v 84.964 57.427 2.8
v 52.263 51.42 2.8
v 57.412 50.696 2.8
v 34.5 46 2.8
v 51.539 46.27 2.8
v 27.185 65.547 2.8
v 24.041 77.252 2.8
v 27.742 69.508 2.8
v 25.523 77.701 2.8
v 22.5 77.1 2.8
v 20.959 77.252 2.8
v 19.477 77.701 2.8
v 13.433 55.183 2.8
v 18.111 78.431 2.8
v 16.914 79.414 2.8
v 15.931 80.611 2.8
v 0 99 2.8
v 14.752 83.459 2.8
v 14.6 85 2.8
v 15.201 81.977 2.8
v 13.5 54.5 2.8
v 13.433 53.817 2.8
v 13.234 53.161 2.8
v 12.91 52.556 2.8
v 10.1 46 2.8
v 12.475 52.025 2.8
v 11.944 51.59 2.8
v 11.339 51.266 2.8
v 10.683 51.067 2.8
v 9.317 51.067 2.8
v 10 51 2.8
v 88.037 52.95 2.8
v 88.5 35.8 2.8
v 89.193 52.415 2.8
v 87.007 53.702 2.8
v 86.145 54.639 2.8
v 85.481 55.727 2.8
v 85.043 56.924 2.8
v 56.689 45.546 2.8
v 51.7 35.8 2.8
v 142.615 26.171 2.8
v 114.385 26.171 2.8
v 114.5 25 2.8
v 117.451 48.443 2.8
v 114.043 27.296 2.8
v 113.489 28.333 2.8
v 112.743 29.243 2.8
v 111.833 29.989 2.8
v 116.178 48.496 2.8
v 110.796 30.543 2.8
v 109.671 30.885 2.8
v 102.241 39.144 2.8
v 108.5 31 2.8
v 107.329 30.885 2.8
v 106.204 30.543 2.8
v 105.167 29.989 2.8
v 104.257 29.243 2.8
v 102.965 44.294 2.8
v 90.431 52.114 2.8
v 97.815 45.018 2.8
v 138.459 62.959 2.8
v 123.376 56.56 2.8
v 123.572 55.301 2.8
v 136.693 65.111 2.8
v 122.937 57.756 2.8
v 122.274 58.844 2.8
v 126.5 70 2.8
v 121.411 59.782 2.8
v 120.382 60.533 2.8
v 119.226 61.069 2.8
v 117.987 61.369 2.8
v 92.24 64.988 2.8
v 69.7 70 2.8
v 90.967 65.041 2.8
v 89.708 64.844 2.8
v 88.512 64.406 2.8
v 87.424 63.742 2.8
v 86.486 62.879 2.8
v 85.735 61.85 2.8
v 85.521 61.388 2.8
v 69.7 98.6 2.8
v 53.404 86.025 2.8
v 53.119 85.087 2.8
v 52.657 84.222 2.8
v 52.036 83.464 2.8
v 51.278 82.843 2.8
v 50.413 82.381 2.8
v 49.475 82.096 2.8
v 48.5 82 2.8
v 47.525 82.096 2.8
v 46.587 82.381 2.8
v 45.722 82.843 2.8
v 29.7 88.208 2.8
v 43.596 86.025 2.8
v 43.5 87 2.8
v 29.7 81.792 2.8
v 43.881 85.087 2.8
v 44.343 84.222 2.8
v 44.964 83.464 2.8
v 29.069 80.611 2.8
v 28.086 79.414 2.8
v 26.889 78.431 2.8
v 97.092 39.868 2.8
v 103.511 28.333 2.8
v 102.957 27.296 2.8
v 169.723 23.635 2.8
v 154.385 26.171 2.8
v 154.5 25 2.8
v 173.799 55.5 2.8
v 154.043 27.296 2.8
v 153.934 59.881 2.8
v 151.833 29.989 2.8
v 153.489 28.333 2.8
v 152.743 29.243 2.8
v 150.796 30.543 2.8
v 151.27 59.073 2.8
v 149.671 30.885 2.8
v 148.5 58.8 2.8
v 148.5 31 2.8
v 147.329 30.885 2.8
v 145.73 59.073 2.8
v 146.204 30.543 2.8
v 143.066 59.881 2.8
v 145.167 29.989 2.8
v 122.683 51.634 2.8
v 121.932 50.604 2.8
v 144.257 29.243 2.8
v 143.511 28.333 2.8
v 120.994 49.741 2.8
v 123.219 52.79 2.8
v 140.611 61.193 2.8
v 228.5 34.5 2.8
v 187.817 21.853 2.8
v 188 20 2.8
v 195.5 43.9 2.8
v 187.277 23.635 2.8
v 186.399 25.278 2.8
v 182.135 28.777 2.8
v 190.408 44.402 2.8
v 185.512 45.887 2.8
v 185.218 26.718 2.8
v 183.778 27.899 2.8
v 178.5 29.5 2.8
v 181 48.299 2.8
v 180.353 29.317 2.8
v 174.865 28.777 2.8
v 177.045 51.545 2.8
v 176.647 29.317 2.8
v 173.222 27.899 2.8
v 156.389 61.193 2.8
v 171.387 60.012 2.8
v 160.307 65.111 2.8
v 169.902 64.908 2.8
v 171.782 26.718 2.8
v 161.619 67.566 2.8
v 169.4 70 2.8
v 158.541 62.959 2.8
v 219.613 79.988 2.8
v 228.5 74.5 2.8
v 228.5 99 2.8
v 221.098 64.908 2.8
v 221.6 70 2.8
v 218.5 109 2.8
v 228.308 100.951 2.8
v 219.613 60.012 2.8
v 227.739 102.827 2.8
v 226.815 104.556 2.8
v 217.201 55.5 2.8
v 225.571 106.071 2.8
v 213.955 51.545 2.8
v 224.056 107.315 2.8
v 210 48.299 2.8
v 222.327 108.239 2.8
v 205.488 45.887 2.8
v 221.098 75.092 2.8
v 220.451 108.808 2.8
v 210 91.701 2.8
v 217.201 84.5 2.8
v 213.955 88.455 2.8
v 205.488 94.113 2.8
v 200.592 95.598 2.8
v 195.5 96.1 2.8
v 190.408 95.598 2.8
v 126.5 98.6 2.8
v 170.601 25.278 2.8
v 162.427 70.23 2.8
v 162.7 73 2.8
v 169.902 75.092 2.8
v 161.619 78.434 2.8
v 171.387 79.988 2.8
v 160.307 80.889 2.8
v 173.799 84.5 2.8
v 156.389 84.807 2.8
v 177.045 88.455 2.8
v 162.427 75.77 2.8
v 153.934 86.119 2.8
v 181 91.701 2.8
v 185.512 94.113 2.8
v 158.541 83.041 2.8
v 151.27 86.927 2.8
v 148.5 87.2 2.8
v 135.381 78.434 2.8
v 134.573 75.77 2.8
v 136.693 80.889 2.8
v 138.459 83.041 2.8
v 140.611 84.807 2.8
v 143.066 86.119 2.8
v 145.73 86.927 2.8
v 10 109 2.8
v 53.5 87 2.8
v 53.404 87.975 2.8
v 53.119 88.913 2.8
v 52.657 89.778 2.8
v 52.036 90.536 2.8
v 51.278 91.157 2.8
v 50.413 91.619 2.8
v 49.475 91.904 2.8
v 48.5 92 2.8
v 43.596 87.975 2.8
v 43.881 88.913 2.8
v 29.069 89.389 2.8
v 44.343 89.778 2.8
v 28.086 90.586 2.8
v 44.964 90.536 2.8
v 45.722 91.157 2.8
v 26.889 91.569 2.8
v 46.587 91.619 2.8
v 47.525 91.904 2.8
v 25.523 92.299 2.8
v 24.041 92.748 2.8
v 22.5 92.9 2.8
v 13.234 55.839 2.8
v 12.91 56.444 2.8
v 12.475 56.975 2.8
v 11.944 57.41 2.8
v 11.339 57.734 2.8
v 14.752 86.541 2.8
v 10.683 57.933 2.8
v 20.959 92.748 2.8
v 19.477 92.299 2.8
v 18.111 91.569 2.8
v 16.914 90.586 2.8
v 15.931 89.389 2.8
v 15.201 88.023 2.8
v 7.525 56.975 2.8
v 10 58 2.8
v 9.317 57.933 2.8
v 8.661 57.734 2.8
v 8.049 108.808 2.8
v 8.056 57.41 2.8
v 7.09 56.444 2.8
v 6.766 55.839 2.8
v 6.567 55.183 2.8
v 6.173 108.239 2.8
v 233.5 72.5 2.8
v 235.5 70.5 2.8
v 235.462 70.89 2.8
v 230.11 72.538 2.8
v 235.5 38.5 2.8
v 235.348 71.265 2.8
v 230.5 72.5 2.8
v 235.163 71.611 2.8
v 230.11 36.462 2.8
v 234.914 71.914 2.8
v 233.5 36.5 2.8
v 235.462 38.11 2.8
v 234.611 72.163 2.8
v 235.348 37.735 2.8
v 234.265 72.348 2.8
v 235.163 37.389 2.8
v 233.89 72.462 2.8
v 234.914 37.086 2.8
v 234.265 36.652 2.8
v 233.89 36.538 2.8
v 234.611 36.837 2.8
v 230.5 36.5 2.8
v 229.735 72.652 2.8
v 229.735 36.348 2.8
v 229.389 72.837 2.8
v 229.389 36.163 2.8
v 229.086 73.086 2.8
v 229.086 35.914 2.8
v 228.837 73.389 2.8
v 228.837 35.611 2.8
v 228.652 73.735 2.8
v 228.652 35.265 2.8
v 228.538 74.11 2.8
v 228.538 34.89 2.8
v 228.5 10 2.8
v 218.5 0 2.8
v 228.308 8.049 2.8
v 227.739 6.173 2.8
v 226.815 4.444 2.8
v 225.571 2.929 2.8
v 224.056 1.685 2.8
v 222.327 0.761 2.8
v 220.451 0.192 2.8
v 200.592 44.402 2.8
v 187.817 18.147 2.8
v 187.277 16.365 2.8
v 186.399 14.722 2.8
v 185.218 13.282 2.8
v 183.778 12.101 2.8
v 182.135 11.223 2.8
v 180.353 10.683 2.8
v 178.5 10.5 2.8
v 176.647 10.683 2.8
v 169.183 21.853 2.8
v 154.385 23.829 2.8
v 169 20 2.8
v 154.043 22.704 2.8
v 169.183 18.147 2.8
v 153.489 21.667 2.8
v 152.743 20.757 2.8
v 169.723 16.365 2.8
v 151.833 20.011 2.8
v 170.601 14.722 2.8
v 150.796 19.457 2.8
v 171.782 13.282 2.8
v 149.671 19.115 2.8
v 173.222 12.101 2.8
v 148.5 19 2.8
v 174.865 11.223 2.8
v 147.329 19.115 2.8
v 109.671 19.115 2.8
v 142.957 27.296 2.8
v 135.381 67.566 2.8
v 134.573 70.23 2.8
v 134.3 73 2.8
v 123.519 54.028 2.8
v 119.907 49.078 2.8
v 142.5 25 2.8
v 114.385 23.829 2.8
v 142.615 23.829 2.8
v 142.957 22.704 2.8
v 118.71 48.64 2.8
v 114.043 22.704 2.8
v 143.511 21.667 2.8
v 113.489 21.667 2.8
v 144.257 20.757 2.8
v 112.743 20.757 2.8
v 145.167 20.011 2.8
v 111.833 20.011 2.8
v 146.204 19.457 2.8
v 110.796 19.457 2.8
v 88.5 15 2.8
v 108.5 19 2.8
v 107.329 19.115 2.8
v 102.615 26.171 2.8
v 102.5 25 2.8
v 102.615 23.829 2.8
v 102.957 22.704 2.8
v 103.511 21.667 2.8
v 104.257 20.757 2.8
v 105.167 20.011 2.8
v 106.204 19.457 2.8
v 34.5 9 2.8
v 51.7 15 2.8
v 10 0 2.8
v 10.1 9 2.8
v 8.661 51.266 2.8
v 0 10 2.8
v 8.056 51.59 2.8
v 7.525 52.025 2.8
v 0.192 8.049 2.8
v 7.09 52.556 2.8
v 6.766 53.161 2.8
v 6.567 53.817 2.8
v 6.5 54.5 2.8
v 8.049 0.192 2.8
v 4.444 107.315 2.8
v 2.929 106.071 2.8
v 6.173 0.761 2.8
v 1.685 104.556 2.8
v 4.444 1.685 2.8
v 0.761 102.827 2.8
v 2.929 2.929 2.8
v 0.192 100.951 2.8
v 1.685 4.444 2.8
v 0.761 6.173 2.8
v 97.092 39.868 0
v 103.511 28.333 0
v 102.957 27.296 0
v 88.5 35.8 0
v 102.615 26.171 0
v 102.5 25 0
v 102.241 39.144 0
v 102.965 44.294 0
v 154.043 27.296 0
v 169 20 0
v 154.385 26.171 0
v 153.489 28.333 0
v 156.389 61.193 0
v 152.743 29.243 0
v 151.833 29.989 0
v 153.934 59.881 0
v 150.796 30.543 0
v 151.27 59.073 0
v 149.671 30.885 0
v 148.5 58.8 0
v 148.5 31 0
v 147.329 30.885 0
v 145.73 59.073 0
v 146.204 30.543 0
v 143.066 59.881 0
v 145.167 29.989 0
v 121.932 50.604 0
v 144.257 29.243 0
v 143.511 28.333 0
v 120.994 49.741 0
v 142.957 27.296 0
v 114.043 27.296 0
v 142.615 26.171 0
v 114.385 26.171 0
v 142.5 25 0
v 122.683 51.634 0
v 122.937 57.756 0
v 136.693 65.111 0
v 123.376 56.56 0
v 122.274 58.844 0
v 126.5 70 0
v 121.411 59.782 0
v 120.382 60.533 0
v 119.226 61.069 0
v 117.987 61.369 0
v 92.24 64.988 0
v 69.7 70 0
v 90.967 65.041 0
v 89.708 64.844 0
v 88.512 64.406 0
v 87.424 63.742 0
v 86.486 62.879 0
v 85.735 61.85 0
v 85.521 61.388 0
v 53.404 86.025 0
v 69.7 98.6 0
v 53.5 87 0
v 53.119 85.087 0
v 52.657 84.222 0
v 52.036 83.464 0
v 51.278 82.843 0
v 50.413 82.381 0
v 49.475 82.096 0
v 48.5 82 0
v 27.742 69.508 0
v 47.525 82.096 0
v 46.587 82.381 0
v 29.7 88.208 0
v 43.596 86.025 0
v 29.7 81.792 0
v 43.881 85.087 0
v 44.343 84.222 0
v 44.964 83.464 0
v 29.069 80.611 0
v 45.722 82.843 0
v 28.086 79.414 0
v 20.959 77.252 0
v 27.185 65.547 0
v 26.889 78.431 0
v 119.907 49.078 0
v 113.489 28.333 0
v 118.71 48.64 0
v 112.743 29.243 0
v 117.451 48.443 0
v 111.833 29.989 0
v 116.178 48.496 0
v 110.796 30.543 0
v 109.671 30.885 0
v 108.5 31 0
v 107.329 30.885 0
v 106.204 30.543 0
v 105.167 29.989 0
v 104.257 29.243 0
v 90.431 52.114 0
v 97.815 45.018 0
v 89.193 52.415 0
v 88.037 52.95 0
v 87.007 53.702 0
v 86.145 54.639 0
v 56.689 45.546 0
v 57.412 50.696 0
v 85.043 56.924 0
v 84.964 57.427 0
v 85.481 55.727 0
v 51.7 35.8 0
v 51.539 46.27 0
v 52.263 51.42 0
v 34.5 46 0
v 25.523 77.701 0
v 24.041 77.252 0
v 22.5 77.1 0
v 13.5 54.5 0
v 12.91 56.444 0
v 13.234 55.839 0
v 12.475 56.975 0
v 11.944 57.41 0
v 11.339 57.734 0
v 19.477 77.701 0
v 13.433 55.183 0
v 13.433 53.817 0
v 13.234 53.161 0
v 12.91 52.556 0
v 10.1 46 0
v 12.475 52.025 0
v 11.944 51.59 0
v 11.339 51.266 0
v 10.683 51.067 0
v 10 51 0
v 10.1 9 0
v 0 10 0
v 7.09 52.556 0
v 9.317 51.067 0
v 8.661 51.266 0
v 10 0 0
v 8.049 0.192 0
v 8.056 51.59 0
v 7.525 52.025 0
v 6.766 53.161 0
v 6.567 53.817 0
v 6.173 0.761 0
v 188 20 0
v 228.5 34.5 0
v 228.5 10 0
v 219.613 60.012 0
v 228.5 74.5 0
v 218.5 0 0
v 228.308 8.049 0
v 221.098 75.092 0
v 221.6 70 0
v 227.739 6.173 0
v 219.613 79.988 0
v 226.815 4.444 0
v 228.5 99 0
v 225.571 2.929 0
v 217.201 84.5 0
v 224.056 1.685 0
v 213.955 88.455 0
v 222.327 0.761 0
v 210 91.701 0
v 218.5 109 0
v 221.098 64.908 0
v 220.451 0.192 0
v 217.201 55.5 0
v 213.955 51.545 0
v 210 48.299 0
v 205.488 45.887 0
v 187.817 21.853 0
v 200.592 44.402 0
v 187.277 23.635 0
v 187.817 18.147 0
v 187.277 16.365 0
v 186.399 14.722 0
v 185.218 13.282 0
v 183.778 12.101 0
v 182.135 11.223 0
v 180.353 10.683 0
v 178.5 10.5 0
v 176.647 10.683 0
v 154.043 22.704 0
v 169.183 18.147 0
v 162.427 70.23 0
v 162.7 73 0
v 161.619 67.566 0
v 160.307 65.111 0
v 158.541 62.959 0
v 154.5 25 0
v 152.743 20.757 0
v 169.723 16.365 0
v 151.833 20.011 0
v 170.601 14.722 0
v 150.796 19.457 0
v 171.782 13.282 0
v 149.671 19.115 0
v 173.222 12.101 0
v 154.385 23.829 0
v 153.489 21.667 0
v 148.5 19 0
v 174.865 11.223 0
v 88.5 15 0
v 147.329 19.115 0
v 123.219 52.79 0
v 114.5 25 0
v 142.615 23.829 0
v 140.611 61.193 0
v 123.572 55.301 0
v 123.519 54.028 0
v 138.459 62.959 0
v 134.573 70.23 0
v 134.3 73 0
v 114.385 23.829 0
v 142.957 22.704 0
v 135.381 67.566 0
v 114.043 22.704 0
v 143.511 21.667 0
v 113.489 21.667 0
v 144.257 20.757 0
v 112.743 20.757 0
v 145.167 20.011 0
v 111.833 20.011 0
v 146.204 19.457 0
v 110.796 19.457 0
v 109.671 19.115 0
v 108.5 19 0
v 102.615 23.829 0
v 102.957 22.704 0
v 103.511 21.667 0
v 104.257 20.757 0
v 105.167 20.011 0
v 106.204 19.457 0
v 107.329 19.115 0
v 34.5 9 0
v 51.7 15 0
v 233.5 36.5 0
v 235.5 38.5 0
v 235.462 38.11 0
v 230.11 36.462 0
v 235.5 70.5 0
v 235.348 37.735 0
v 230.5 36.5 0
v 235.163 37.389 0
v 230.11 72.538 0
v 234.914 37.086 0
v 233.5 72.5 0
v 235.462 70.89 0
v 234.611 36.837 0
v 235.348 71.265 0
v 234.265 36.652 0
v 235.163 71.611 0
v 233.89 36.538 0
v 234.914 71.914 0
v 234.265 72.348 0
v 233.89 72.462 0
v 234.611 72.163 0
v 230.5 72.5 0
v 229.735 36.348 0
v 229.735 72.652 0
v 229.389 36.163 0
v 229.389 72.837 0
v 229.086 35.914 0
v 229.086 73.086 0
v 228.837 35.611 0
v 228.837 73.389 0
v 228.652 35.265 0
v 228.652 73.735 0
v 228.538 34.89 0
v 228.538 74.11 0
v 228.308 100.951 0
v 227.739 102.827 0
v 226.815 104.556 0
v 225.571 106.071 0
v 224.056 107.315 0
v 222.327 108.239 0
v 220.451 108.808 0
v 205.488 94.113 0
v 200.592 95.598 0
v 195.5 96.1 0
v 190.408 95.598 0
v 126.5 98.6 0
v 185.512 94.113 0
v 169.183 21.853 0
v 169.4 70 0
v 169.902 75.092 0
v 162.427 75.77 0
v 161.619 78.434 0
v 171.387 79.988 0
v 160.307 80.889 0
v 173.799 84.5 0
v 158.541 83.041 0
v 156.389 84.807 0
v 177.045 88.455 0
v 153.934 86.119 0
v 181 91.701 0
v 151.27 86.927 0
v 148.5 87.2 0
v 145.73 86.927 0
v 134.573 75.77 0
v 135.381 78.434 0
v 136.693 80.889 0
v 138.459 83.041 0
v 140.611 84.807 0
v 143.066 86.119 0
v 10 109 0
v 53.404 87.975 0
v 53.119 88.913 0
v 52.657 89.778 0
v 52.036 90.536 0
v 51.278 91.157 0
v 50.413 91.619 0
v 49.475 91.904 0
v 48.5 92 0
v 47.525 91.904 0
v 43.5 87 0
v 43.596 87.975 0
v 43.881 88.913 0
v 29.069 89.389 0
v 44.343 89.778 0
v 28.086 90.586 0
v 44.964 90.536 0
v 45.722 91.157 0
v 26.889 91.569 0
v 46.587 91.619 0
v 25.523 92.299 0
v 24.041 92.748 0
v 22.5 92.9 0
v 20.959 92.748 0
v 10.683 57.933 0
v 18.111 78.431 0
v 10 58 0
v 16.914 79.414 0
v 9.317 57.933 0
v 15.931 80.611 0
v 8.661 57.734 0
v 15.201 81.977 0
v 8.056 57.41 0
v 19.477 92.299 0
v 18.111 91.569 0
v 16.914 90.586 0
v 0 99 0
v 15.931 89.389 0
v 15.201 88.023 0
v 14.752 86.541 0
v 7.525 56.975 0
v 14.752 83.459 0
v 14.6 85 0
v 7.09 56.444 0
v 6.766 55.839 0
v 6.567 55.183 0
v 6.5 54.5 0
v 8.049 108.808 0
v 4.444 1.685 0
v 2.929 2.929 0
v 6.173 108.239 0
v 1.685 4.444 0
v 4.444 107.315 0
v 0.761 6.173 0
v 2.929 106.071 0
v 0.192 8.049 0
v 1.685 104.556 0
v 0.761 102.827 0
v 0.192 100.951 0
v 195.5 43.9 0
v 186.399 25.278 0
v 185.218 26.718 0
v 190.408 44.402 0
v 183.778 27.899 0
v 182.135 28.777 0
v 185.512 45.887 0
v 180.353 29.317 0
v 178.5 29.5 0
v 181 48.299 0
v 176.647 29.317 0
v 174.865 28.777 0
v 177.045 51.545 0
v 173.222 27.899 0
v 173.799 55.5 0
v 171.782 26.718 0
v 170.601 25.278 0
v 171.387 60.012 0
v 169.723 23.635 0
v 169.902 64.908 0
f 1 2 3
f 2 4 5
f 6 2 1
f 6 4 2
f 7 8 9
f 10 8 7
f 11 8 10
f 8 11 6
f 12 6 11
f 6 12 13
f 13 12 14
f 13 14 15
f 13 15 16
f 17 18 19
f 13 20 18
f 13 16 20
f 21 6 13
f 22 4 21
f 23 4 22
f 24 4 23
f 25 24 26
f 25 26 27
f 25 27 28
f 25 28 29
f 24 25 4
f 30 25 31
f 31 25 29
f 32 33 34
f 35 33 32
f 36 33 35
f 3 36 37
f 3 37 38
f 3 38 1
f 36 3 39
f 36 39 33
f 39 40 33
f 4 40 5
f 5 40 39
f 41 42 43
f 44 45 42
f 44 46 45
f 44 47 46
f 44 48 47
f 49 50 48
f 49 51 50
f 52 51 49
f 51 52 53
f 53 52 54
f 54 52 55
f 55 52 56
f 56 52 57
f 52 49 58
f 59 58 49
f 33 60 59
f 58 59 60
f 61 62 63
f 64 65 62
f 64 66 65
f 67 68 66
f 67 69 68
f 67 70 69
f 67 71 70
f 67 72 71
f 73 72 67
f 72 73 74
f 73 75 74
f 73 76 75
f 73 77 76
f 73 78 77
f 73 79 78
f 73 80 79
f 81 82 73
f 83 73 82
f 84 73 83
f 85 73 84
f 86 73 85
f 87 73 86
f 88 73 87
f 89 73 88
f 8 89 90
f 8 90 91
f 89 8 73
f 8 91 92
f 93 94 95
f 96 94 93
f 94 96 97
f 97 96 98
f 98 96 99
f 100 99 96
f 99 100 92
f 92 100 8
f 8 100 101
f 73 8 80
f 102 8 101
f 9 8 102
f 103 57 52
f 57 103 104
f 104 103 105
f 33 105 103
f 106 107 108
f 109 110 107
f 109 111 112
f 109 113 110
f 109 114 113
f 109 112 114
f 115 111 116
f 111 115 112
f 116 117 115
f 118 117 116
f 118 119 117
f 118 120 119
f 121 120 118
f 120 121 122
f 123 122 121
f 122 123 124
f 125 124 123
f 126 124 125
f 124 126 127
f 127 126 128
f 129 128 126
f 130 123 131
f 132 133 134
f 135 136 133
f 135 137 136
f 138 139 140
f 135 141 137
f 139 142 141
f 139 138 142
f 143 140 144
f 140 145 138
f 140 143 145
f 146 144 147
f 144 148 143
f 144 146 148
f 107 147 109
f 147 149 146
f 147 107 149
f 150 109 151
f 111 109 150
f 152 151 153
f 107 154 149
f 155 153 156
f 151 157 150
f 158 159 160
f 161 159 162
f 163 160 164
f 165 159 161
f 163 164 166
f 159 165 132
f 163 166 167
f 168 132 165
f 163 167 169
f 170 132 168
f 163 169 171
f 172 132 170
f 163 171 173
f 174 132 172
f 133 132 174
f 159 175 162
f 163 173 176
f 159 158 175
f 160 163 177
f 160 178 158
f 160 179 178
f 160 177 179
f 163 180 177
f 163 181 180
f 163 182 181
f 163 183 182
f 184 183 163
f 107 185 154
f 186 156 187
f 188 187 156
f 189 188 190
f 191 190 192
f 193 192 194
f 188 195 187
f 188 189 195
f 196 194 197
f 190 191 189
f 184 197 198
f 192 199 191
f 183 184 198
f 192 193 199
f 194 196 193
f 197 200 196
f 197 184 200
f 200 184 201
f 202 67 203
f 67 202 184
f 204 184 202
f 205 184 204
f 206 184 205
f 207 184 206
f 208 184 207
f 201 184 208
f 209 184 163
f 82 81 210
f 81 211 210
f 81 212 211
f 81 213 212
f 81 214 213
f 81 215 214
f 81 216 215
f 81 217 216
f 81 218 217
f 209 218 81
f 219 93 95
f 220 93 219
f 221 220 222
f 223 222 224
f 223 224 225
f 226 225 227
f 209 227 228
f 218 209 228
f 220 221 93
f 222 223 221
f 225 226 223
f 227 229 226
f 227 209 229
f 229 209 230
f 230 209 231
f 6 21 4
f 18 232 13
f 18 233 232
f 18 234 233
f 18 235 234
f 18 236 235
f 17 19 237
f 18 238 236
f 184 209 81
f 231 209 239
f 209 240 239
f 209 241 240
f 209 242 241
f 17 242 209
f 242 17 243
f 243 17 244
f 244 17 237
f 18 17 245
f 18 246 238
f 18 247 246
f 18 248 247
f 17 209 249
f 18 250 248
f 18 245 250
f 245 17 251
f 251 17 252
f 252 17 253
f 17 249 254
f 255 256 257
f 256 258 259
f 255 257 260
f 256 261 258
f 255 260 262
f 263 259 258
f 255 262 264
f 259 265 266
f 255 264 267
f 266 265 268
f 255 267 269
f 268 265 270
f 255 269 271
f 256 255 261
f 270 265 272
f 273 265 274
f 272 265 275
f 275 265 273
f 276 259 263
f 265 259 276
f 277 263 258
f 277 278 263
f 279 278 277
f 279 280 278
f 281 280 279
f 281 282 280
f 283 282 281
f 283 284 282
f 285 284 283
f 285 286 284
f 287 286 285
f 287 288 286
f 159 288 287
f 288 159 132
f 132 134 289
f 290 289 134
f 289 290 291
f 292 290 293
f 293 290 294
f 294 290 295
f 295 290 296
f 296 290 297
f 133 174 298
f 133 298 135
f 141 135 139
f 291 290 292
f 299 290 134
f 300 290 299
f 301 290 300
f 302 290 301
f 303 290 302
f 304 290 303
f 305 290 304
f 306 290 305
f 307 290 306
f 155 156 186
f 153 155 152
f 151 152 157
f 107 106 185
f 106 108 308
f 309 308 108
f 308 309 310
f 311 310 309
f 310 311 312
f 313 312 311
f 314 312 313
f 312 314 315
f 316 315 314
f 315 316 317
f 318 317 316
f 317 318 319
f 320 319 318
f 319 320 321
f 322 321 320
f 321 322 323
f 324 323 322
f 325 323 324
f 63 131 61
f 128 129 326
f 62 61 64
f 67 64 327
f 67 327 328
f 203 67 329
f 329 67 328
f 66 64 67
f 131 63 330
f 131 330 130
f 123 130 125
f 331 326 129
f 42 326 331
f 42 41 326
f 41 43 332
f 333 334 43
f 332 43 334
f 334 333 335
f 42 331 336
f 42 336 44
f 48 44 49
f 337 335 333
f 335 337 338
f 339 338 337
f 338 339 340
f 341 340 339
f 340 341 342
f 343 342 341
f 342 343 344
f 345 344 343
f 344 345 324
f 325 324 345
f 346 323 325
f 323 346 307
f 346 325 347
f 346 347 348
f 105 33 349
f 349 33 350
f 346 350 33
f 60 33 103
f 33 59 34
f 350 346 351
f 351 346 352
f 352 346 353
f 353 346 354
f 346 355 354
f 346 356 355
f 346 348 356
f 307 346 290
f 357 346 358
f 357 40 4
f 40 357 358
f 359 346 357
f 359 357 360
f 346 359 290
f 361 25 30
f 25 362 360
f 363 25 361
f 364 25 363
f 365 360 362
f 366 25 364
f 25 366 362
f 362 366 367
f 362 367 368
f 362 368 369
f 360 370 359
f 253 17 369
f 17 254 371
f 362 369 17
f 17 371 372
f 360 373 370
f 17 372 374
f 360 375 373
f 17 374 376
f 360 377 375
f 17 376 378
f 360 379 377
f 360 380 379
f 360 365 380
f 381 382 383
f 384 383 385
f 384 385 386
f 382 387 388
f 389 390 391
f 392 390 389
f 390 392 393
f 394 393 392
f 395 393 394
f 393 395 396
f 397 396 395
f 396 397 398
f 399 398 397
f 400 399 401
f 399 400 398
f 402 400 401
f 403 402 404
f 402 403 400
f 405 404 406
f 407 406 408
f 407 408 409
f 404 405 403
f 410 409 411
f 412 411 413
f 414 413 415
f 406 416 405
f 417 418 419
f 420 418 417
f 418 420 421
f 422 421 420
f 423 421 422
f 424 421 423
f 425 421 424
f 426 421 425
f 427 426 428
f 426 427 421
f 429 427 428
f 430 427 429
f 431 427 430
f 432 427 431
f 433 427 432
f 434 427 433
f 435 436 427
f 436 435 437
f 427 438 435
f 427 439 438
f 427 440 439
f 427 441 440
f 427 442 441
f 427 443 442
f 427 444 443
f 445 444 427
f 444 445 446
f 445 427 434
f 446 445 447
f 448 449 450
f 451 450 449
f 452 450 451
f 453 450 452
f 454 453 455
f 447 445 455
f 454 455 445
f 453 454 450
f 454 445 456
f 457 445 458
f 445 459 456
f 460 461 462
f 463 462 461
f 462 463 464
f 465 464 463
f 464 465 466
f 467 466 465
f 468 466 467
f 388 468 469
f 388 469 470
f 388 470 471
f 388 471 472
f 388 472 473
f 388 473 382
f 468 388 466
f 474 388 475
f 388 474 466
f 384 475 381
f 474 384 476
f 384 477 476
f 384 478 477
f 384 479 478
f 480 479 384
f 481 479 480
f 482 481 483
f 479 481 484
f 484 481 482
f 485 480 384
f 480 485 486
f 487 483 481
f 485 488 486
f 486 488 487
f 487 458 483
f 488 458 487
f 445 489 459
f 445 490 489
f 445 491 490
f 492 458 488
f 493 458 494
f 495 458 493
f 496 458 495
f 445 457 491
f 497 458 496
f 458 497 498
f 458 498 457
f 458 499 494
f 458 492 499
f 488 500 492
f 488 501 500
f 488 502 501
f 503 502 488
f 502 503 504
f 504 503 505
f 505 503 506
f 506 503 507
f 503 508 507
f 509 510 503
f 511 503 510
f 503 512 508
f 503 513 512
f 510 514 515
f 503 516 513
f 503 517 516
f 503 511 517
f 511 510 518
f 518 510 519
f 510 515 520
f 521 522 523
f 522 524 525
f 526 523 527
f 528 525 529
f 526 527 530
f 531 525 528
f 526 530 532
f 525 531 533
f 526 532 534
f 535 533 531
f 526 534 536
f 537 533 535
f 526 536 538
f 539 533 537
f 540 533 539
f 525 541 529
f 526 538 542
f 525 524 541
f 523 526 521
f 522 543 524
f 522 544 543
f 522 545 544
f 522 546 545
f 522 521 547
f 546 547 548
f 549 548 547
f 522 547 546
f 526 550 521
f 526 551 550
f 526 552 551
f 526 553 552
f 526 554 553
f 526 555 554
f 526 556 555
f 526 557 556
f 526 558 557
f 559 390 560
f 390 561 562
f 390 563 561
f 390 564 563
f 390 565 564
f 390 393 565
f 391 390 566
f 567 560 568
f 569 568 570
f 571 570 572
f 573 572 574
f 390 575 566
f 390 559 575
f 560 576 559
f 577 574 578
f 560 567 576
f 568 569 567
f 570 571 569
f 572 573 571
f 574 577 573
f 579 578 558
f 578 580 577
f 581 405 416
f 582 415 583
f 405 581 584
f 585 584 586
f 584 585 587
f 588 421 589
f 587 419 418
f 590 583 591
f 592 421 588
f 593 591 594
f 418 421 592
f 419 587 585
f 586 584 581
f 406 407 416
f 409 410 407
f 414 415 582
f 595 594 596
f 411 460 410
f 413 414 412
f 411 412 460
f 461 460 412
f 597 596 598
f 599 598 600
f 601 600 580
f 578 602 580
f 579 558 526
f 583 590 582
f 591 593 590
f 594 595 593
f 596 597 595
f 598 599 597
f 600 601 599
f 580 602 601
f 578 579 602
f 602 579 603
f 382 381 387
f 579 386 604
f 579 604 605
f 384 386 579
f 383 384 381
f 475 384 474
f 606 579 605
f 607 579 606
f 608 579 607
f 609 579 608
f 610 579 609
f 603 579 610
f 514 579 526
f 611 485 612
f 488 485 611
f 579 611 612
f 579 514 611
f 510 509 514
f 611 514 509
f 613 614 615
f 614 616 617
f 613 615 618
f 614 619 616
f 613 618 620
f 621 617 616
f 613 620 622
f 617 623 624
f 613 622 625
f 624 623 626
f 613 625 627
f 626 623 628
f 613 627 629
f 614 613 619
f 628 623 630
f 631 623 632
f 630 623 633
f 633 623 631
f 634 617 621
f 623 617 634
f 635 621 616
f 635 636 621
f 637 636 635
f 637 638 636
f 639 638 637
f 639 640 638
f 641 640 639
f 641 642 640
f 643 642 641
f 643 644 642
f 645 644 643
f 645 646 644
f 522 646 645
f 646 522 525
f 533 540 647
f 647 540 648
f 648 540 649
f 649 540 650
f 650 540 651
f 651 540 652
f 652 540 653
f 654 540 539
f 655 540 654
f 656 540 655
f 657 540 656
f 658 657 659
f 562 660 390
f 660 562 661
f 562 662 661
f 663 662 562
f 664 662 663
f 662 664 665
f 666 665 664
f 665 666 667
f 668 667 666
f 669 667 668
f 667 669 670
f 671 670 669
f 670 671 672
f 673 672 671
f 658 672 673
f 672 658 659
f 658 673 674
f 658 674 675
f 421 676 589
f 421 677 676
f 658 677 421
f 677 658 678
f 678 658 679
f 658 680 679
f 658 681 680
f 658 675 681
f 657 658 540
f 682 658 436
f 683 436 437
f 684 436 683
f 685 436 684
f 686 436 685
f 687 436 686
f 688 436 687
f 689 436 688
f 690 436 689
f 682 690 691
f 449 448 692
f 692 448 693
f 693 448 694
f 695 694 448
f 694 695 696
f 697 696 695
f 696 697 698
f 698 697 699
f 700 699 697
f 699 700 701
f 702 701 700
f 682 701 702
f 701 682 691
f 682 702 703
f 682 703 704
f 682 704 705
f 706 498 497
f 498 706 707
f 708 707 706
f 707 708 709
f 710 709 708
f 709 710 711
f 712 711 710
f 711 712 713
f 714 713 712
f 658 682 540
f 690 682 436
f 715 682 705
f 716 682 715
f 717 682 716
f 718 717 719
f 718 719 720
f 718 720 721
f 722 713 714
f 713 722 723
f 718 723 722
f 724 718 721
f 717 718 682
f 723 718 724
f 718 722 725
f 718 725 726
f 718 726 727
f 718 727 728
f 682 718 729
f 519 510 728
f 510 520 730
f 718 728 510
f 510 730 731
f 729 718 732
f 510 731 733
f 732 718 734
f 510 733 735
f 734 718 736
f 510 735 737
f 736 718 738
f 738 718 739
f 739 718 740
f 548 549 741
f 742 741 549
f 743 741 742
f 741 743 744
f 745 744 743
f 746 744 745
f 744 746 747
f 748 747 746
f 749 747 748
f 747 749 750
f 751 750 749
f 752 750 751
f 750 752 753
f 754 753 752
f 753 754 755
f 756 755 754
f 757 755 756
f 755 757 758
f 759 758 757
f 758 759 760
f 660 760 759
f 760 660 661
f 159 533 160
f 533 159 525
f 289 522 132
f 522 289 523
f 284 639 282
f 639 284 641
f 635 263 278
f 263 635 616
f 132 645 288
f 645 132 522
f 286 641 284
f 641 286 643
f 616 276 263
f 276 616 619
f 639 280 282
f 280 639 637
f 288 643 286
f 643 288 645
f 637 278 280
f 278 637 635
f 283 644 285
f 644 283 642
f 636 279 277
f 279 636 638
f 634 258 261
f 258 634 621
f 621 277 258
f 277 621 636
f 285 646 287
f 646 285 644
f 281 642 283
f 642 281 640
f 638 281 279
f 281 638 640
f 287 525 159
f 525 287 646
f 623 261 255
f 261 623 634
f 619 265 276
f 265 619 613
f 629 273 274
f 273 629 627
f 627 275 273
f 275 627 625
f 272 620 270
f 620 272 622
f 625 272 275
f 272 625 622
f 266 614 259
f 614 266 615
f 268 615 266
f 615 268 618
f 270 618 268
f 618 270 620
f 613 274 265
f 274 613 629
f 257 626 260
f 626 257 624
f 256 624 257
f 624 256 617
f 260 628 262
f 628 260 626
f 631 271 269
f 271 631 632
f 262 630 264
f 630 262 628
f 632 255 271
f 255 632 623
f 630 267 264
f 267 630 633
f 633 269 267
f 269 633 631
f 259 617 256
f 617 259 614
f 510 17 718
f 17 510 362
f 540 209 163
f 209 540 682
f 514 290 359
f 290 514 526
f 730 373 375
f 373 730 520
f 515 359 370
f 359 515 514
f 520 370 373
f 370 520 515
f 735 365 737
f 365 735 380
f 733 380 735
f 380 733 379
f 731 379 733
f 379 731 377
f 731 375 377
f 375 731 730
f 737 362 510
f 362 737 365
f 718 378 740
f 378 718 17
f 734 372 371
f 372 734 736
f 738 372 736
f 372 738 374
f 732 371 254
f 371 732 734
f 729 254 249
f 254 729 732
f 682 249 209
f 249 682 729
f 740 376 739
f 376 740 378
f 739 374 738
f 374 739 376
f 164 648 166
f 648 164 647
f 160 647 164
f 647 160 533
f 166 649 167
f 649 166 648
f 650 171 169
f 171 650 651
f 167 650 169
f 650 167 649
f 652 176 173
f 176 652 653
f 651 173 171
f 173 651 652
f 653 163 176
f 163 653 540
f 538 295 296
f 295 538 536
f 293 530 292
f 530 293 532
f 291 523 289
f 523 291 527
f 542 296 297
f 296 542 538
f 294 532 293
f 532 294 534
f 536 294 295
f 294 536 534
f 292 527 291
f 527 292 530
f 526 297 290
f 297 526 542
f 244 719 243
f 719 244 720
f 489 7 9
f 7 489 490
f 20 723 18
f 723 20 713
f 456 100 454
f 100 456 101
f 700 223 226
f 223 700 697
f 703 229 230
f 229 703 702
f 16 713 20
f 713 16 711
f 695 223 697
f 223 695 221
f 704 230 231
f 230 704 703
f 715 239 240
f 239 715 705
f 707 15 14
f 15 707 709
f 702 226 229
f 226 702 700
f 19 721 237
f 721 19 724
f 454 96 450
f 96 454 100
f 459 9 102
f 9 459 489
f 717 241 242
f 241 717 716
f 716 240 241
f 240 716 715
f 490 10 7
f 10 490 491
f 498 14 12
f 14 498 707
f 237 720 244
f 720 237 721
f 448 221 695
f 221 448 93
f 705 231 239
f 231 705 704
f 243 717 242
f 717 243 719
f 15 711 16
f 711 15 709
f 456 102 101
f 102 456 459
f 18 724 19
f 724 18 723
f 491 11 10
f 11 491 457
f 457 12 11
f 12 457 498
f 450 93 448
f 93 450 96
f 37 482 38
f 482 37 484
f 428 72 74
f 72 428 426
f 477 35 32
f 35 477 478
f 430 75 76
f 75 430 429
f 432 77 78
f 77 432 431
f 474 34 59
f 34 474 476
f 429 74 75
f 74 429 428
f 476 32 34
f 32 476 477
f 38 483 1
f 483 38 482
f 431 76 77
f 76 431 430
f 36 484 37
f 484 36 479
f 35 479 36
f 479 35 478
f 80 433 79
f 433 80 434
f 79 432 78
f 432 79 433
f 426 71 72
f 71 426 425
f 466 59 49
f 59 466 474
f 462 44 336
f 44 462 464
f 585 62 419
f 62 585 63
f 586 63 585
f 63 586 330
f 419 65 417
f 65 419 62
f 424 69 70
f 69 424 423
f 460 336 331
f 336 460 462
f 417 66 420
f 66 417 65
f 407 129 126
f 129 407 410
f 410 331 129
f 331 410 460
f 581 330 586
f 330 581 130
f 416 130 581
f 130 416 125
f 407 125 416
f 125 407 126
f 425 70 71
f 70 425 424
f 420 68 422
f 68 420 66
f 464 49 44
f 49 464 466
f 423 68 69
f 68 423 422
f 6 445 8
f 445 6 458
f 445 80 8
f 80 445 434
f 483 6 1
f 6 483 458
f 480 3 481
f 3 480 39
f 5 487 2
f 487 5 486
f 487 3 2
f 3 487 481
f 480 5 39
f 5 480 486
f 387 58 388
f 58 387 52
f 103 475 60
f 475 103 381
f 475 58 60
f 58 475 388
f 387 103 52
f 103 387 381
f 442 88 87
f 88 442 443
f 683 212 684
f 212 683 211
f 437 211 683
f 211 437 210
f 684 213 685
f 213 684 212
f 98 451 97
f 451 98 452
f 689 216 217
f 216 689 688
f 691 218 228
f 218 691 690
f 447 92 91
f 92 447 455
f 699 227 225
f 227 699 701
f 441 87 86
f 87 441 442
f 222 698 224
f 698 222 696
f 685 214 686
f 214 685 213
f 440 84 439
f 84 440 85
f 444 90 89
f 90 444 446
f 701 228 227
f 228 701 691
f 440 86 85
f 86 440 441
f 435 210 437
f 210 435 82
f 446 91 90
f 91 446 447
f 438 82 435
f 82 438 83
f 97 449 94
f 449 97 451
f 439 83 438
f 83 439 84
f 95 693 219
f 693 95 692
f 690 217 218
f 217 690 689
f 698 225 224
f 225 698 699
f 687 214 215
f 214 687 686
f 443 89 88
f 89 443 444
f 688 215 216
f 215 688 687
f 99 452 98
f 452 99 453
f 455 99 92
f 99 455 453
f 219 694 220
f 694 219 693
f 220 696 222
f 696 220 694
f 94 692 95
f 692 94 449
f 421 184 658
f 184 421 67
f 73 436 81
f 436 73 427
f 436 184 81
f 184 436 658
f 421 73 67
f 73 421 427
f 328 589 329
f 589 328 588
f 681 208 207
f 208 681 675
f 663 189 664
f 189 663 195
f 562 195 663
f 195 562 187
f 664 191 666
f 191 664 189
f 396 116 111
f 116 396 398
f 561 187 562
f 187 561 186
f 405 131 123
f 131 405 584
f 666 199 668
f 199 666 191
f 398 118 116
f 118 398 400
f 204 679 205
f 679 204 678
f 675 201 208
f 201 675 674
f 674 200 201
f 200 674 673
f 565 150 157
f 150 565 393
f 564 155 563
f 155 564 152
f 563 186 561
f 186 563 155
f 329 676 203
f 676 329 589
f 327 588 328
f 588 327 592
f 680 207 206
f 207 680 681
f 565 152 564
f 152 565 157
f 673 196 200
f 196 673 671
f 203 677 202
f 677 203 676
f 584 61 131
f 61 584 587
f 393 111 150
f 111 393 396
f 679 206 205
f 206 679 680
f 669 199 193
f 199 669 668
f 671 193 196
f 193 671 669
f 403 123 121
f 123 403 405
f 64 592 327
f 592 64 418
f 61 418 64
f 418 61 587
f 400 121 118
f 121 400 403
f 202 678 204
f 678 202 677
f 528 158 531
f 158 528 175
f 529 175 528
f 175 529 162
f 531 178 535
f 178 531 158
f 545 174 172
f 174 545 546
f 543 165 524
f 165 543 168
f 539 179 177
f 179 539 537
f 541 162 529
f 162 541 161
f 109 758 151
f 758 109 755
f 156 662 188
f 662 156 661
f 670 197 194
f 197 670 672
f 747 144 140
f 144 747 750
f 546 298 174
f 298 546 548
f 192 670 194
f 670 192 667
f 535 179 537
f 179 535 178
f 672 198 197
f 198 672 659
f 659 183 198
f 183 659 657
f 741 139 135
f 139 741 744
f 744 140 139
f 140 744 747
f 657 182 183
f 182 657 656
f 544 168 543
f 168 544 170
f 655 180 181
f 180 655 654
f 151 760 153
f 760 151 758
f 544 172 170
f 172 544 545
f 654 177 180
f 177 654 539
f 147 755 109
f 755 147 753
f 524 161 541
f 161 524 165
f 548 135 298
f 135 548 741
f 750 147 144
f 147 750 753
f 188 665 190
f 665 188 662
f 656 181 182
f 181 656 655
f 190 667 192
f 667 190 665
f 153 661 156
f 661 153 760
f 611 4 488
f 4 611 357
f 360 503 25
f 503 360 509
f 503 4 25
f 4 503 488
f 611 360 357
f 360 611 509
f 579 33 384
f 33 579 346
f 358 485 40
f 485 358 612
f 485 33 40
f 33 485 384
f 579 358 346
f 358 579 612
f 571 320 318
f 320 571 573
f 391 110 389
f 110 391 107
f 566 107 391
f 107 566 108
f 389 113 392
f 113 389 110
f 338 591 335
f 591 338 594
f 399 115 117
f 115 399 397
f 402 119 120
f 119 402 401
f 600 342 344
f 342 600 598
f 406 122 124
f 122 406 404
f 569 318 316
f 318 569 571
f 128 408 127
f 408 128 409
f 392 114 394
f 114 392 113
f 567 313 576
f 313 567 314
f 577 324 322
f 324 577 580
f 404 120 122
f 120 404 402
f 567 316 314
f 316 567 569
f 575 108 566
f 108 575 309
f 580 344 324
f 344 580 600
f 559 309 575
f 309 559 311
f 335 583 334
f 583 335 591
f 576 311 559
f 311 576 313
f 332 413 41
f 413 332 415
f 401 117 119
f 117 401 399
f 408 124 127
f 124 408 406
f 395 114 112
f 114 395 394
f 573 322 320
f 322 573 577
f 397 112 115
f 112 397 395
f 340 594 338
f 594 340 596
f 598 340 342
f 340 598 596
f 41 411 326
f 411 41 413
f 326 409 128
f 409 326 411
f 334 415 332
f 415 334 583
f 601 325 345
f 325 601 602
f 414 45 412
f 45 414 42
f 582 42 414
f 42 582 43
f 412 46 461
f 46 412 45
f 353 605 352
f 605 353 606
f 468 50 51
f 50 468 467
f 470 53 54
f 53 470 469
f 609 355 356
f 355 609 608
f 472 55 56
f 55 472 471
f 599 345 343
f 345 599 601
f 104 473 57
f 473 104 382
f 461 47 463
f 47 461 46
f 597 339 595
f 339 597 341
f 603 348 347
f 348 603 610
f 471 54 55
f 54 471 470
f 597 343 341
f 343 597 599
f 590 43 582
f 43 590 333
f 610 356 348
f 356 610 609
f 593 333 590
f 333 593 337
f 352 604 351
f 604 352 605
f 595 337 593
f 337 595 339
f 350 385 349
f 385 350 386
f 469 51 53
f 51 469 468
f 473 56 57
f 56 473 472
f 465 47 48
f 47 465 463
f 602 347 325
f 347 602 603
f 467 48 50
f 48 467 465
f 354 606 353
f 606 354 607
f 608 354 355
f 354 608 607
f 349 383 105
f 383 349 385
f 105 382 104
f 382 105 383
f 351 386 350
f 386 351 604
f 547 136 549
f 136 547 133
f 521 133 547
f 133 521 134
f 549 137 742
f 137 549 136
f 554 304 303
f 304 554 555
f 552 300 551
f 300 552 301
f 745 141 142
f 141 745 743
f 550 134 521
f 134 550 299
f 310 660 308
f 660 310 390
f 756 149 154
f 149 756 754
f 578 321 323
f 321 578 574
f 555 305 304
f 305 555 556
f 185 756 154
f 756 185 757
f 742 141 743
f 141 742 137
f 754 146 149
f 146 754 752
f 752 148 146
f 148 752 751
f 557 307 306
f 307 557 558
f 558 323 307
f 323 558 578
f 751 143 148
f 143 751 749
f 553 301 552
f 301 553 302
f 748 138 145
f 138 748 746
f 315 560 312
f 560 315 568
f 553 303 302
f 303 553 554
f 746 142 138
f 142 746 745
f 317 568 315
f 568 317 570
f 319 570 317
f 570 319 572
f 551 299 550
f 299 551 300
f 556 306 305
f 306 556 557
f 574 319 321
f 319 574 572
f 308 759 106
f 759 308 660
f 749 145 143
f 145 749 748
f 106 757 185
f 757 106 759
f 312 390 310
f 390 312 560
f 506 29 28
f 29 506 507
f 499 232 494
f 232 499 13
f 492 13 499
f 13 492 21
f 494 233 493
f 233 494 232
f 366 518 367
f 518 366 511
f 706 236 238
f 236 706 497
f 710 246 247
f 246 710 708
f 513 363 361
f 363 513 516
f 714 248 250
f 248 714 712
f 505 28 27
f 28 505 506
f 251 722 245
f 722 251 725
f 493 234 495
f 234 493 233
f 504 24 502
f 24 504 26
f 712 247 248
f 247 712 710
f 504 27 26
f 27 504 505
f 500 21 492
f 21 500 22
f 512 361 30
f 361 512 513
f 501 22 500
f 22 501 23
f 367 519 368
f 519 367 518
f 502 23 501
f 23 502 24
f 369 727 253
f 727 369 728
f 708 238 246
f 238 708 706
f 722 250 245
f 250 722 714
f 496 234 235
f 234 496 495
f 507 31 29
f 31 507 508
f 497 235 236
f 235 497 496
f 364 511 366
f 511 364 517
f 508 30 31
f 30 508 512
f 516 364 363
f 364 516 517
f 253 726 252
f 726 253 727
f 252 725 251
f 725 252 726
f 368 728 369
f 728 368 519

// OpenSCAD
$fn=32;

// projection(cut = true) 
mowerPlate();

module mowerPlate() {
  difference() {
    plateLength = 228.5; 
    plateWidth = 109; 
    plateThickness = 2.8;
  
    plate(l=plateLength,w=plateWidth,t=plateThickness);
    roundHoleFlatSide(r=7.9, c=0.7, x=22.5, y=85); // 1
    roundHole(r=5, x=48.5, y=87); // 2
    rectangleHole(l=56.8, w=28.6, x=69.7, y=70); // 3
    roundHole(r=14.2, x=148.5, y=73); // 4
    roundHole(r=26.1, x=195.5, y=70); // 5

    rectangleHole(l=24.4, w=37, x=10.1, y=9); // 3
    rectangleHole(l=36.8, w=20.8, x=51.7, y=15); // 3
    roundHole(r=6, x=148.5, y=25); // 9
    roundHole(r=6, x=108.5, y=25); // 10
    roundHole(r=9.5, x=178.5, y=20); // 11
    roundHole(r=3.5, x=10, y=plateWidth/2); // 12

    weirdThing(x=25,y=50,a=-8); // 6, 13, 14
  }
}

module plate(l,w,t) {
  cr = 10; //corner radius

  translate([0,cr,0]) cube([l,w-cr*2,t]);
  translate([cr,0,0]) cube([l-cr*2,w,t]);
  translate([cr,cr,0]) cylinder(r=cr,h=t);
  translate([cr,w-cr,0]) cylinder(r=cr,h=t);
  translate([l-cr,w-cr,0]) cylinder(r=cr,h=t);
  translate([l-cr,cr,0]) cylinder(r=cr,h=t);
  translate([l,w/2,0]) tab(t);
}

module tab(t) {
  tw = 36; //tab width
  td = 7;  //tab depth
  tcr = 2; //tab corner radius;
  twr = 2; //tab wing radius;
  translate([0,-tw/2,0]) {
  cube([td-tcr,tw,t]);
  translate([td-tcr,tcr,0]) cylinder(r=tcr,h=t);
  translate([td-tcr,tw-tcr,0]) cylinder(r=tcr,h=t);
  translate([0,tcr,0]) cube([td,tw-tcr*2,t]);
  translate([0,-twr,0]) difference() {
    cube([twr,tw+twr*2,t]);
    translate([twr,0,-1]) cylinder(r=twr,h=t+2);
    translate([twr,tw+twr*2,-1]) cylinder(r=twr,h=t+2);
  }
  }
}

module weirdThing(x,y,a) {
  translate([x,y,0]) rotate([0,0,a]) union() {

    narrowLength=58;
    narrowWidth=4;

    fatLength=39;
    fatWidth=13;

    smallHoleDist=46;
    smallHoleX=26.8;

    //narrow bit - 6
    rectangleHole(l=narrowLength+0.5, w=narrowWidth, x=0, y=5.2+6+fatWidth/2-narrowWidth/2); // 6

    //fat bit - 6 
    roundedRectangle(fatLength,fatWidth,narrowLength,5.2+6); //6
  
    //small holes 13 & 14
    rectangleHole(l=5.2, w=5.2, x=smallHoleX, y=0); // 13
    rectangleHole(l=5.2, w=5.2, x=smallHoleX+smallHoleDist, y=0); // 14
  }
}

module roundedRectangle(length,width,x,y) {
  translate([x,y,0]) {
    roundHole(r=width/2, x=width/2, y=width/2); 
    rectangleHole(l=length-width, w=width, x=width/2, y=0); 
    roundHole(r=width/2, x=length-width/2, y=width/2); 
  }
}

module roundHole(r,x,y) {
  translate([x,y,-50]) cylinder(r=r,h=100);
}

module roundHoleFlatSide(r,c,x,y) {
  translate([x,y,0]) difference() {
    roundHole(r,x=0,y=0);
    translate([r-c,-r,-50]) cube([r*2,r*2,100]);
  }
}

module rectangleHole(l,w,x,y) {
  translate([x,y,-50]) cube([l,w,100]);
}
